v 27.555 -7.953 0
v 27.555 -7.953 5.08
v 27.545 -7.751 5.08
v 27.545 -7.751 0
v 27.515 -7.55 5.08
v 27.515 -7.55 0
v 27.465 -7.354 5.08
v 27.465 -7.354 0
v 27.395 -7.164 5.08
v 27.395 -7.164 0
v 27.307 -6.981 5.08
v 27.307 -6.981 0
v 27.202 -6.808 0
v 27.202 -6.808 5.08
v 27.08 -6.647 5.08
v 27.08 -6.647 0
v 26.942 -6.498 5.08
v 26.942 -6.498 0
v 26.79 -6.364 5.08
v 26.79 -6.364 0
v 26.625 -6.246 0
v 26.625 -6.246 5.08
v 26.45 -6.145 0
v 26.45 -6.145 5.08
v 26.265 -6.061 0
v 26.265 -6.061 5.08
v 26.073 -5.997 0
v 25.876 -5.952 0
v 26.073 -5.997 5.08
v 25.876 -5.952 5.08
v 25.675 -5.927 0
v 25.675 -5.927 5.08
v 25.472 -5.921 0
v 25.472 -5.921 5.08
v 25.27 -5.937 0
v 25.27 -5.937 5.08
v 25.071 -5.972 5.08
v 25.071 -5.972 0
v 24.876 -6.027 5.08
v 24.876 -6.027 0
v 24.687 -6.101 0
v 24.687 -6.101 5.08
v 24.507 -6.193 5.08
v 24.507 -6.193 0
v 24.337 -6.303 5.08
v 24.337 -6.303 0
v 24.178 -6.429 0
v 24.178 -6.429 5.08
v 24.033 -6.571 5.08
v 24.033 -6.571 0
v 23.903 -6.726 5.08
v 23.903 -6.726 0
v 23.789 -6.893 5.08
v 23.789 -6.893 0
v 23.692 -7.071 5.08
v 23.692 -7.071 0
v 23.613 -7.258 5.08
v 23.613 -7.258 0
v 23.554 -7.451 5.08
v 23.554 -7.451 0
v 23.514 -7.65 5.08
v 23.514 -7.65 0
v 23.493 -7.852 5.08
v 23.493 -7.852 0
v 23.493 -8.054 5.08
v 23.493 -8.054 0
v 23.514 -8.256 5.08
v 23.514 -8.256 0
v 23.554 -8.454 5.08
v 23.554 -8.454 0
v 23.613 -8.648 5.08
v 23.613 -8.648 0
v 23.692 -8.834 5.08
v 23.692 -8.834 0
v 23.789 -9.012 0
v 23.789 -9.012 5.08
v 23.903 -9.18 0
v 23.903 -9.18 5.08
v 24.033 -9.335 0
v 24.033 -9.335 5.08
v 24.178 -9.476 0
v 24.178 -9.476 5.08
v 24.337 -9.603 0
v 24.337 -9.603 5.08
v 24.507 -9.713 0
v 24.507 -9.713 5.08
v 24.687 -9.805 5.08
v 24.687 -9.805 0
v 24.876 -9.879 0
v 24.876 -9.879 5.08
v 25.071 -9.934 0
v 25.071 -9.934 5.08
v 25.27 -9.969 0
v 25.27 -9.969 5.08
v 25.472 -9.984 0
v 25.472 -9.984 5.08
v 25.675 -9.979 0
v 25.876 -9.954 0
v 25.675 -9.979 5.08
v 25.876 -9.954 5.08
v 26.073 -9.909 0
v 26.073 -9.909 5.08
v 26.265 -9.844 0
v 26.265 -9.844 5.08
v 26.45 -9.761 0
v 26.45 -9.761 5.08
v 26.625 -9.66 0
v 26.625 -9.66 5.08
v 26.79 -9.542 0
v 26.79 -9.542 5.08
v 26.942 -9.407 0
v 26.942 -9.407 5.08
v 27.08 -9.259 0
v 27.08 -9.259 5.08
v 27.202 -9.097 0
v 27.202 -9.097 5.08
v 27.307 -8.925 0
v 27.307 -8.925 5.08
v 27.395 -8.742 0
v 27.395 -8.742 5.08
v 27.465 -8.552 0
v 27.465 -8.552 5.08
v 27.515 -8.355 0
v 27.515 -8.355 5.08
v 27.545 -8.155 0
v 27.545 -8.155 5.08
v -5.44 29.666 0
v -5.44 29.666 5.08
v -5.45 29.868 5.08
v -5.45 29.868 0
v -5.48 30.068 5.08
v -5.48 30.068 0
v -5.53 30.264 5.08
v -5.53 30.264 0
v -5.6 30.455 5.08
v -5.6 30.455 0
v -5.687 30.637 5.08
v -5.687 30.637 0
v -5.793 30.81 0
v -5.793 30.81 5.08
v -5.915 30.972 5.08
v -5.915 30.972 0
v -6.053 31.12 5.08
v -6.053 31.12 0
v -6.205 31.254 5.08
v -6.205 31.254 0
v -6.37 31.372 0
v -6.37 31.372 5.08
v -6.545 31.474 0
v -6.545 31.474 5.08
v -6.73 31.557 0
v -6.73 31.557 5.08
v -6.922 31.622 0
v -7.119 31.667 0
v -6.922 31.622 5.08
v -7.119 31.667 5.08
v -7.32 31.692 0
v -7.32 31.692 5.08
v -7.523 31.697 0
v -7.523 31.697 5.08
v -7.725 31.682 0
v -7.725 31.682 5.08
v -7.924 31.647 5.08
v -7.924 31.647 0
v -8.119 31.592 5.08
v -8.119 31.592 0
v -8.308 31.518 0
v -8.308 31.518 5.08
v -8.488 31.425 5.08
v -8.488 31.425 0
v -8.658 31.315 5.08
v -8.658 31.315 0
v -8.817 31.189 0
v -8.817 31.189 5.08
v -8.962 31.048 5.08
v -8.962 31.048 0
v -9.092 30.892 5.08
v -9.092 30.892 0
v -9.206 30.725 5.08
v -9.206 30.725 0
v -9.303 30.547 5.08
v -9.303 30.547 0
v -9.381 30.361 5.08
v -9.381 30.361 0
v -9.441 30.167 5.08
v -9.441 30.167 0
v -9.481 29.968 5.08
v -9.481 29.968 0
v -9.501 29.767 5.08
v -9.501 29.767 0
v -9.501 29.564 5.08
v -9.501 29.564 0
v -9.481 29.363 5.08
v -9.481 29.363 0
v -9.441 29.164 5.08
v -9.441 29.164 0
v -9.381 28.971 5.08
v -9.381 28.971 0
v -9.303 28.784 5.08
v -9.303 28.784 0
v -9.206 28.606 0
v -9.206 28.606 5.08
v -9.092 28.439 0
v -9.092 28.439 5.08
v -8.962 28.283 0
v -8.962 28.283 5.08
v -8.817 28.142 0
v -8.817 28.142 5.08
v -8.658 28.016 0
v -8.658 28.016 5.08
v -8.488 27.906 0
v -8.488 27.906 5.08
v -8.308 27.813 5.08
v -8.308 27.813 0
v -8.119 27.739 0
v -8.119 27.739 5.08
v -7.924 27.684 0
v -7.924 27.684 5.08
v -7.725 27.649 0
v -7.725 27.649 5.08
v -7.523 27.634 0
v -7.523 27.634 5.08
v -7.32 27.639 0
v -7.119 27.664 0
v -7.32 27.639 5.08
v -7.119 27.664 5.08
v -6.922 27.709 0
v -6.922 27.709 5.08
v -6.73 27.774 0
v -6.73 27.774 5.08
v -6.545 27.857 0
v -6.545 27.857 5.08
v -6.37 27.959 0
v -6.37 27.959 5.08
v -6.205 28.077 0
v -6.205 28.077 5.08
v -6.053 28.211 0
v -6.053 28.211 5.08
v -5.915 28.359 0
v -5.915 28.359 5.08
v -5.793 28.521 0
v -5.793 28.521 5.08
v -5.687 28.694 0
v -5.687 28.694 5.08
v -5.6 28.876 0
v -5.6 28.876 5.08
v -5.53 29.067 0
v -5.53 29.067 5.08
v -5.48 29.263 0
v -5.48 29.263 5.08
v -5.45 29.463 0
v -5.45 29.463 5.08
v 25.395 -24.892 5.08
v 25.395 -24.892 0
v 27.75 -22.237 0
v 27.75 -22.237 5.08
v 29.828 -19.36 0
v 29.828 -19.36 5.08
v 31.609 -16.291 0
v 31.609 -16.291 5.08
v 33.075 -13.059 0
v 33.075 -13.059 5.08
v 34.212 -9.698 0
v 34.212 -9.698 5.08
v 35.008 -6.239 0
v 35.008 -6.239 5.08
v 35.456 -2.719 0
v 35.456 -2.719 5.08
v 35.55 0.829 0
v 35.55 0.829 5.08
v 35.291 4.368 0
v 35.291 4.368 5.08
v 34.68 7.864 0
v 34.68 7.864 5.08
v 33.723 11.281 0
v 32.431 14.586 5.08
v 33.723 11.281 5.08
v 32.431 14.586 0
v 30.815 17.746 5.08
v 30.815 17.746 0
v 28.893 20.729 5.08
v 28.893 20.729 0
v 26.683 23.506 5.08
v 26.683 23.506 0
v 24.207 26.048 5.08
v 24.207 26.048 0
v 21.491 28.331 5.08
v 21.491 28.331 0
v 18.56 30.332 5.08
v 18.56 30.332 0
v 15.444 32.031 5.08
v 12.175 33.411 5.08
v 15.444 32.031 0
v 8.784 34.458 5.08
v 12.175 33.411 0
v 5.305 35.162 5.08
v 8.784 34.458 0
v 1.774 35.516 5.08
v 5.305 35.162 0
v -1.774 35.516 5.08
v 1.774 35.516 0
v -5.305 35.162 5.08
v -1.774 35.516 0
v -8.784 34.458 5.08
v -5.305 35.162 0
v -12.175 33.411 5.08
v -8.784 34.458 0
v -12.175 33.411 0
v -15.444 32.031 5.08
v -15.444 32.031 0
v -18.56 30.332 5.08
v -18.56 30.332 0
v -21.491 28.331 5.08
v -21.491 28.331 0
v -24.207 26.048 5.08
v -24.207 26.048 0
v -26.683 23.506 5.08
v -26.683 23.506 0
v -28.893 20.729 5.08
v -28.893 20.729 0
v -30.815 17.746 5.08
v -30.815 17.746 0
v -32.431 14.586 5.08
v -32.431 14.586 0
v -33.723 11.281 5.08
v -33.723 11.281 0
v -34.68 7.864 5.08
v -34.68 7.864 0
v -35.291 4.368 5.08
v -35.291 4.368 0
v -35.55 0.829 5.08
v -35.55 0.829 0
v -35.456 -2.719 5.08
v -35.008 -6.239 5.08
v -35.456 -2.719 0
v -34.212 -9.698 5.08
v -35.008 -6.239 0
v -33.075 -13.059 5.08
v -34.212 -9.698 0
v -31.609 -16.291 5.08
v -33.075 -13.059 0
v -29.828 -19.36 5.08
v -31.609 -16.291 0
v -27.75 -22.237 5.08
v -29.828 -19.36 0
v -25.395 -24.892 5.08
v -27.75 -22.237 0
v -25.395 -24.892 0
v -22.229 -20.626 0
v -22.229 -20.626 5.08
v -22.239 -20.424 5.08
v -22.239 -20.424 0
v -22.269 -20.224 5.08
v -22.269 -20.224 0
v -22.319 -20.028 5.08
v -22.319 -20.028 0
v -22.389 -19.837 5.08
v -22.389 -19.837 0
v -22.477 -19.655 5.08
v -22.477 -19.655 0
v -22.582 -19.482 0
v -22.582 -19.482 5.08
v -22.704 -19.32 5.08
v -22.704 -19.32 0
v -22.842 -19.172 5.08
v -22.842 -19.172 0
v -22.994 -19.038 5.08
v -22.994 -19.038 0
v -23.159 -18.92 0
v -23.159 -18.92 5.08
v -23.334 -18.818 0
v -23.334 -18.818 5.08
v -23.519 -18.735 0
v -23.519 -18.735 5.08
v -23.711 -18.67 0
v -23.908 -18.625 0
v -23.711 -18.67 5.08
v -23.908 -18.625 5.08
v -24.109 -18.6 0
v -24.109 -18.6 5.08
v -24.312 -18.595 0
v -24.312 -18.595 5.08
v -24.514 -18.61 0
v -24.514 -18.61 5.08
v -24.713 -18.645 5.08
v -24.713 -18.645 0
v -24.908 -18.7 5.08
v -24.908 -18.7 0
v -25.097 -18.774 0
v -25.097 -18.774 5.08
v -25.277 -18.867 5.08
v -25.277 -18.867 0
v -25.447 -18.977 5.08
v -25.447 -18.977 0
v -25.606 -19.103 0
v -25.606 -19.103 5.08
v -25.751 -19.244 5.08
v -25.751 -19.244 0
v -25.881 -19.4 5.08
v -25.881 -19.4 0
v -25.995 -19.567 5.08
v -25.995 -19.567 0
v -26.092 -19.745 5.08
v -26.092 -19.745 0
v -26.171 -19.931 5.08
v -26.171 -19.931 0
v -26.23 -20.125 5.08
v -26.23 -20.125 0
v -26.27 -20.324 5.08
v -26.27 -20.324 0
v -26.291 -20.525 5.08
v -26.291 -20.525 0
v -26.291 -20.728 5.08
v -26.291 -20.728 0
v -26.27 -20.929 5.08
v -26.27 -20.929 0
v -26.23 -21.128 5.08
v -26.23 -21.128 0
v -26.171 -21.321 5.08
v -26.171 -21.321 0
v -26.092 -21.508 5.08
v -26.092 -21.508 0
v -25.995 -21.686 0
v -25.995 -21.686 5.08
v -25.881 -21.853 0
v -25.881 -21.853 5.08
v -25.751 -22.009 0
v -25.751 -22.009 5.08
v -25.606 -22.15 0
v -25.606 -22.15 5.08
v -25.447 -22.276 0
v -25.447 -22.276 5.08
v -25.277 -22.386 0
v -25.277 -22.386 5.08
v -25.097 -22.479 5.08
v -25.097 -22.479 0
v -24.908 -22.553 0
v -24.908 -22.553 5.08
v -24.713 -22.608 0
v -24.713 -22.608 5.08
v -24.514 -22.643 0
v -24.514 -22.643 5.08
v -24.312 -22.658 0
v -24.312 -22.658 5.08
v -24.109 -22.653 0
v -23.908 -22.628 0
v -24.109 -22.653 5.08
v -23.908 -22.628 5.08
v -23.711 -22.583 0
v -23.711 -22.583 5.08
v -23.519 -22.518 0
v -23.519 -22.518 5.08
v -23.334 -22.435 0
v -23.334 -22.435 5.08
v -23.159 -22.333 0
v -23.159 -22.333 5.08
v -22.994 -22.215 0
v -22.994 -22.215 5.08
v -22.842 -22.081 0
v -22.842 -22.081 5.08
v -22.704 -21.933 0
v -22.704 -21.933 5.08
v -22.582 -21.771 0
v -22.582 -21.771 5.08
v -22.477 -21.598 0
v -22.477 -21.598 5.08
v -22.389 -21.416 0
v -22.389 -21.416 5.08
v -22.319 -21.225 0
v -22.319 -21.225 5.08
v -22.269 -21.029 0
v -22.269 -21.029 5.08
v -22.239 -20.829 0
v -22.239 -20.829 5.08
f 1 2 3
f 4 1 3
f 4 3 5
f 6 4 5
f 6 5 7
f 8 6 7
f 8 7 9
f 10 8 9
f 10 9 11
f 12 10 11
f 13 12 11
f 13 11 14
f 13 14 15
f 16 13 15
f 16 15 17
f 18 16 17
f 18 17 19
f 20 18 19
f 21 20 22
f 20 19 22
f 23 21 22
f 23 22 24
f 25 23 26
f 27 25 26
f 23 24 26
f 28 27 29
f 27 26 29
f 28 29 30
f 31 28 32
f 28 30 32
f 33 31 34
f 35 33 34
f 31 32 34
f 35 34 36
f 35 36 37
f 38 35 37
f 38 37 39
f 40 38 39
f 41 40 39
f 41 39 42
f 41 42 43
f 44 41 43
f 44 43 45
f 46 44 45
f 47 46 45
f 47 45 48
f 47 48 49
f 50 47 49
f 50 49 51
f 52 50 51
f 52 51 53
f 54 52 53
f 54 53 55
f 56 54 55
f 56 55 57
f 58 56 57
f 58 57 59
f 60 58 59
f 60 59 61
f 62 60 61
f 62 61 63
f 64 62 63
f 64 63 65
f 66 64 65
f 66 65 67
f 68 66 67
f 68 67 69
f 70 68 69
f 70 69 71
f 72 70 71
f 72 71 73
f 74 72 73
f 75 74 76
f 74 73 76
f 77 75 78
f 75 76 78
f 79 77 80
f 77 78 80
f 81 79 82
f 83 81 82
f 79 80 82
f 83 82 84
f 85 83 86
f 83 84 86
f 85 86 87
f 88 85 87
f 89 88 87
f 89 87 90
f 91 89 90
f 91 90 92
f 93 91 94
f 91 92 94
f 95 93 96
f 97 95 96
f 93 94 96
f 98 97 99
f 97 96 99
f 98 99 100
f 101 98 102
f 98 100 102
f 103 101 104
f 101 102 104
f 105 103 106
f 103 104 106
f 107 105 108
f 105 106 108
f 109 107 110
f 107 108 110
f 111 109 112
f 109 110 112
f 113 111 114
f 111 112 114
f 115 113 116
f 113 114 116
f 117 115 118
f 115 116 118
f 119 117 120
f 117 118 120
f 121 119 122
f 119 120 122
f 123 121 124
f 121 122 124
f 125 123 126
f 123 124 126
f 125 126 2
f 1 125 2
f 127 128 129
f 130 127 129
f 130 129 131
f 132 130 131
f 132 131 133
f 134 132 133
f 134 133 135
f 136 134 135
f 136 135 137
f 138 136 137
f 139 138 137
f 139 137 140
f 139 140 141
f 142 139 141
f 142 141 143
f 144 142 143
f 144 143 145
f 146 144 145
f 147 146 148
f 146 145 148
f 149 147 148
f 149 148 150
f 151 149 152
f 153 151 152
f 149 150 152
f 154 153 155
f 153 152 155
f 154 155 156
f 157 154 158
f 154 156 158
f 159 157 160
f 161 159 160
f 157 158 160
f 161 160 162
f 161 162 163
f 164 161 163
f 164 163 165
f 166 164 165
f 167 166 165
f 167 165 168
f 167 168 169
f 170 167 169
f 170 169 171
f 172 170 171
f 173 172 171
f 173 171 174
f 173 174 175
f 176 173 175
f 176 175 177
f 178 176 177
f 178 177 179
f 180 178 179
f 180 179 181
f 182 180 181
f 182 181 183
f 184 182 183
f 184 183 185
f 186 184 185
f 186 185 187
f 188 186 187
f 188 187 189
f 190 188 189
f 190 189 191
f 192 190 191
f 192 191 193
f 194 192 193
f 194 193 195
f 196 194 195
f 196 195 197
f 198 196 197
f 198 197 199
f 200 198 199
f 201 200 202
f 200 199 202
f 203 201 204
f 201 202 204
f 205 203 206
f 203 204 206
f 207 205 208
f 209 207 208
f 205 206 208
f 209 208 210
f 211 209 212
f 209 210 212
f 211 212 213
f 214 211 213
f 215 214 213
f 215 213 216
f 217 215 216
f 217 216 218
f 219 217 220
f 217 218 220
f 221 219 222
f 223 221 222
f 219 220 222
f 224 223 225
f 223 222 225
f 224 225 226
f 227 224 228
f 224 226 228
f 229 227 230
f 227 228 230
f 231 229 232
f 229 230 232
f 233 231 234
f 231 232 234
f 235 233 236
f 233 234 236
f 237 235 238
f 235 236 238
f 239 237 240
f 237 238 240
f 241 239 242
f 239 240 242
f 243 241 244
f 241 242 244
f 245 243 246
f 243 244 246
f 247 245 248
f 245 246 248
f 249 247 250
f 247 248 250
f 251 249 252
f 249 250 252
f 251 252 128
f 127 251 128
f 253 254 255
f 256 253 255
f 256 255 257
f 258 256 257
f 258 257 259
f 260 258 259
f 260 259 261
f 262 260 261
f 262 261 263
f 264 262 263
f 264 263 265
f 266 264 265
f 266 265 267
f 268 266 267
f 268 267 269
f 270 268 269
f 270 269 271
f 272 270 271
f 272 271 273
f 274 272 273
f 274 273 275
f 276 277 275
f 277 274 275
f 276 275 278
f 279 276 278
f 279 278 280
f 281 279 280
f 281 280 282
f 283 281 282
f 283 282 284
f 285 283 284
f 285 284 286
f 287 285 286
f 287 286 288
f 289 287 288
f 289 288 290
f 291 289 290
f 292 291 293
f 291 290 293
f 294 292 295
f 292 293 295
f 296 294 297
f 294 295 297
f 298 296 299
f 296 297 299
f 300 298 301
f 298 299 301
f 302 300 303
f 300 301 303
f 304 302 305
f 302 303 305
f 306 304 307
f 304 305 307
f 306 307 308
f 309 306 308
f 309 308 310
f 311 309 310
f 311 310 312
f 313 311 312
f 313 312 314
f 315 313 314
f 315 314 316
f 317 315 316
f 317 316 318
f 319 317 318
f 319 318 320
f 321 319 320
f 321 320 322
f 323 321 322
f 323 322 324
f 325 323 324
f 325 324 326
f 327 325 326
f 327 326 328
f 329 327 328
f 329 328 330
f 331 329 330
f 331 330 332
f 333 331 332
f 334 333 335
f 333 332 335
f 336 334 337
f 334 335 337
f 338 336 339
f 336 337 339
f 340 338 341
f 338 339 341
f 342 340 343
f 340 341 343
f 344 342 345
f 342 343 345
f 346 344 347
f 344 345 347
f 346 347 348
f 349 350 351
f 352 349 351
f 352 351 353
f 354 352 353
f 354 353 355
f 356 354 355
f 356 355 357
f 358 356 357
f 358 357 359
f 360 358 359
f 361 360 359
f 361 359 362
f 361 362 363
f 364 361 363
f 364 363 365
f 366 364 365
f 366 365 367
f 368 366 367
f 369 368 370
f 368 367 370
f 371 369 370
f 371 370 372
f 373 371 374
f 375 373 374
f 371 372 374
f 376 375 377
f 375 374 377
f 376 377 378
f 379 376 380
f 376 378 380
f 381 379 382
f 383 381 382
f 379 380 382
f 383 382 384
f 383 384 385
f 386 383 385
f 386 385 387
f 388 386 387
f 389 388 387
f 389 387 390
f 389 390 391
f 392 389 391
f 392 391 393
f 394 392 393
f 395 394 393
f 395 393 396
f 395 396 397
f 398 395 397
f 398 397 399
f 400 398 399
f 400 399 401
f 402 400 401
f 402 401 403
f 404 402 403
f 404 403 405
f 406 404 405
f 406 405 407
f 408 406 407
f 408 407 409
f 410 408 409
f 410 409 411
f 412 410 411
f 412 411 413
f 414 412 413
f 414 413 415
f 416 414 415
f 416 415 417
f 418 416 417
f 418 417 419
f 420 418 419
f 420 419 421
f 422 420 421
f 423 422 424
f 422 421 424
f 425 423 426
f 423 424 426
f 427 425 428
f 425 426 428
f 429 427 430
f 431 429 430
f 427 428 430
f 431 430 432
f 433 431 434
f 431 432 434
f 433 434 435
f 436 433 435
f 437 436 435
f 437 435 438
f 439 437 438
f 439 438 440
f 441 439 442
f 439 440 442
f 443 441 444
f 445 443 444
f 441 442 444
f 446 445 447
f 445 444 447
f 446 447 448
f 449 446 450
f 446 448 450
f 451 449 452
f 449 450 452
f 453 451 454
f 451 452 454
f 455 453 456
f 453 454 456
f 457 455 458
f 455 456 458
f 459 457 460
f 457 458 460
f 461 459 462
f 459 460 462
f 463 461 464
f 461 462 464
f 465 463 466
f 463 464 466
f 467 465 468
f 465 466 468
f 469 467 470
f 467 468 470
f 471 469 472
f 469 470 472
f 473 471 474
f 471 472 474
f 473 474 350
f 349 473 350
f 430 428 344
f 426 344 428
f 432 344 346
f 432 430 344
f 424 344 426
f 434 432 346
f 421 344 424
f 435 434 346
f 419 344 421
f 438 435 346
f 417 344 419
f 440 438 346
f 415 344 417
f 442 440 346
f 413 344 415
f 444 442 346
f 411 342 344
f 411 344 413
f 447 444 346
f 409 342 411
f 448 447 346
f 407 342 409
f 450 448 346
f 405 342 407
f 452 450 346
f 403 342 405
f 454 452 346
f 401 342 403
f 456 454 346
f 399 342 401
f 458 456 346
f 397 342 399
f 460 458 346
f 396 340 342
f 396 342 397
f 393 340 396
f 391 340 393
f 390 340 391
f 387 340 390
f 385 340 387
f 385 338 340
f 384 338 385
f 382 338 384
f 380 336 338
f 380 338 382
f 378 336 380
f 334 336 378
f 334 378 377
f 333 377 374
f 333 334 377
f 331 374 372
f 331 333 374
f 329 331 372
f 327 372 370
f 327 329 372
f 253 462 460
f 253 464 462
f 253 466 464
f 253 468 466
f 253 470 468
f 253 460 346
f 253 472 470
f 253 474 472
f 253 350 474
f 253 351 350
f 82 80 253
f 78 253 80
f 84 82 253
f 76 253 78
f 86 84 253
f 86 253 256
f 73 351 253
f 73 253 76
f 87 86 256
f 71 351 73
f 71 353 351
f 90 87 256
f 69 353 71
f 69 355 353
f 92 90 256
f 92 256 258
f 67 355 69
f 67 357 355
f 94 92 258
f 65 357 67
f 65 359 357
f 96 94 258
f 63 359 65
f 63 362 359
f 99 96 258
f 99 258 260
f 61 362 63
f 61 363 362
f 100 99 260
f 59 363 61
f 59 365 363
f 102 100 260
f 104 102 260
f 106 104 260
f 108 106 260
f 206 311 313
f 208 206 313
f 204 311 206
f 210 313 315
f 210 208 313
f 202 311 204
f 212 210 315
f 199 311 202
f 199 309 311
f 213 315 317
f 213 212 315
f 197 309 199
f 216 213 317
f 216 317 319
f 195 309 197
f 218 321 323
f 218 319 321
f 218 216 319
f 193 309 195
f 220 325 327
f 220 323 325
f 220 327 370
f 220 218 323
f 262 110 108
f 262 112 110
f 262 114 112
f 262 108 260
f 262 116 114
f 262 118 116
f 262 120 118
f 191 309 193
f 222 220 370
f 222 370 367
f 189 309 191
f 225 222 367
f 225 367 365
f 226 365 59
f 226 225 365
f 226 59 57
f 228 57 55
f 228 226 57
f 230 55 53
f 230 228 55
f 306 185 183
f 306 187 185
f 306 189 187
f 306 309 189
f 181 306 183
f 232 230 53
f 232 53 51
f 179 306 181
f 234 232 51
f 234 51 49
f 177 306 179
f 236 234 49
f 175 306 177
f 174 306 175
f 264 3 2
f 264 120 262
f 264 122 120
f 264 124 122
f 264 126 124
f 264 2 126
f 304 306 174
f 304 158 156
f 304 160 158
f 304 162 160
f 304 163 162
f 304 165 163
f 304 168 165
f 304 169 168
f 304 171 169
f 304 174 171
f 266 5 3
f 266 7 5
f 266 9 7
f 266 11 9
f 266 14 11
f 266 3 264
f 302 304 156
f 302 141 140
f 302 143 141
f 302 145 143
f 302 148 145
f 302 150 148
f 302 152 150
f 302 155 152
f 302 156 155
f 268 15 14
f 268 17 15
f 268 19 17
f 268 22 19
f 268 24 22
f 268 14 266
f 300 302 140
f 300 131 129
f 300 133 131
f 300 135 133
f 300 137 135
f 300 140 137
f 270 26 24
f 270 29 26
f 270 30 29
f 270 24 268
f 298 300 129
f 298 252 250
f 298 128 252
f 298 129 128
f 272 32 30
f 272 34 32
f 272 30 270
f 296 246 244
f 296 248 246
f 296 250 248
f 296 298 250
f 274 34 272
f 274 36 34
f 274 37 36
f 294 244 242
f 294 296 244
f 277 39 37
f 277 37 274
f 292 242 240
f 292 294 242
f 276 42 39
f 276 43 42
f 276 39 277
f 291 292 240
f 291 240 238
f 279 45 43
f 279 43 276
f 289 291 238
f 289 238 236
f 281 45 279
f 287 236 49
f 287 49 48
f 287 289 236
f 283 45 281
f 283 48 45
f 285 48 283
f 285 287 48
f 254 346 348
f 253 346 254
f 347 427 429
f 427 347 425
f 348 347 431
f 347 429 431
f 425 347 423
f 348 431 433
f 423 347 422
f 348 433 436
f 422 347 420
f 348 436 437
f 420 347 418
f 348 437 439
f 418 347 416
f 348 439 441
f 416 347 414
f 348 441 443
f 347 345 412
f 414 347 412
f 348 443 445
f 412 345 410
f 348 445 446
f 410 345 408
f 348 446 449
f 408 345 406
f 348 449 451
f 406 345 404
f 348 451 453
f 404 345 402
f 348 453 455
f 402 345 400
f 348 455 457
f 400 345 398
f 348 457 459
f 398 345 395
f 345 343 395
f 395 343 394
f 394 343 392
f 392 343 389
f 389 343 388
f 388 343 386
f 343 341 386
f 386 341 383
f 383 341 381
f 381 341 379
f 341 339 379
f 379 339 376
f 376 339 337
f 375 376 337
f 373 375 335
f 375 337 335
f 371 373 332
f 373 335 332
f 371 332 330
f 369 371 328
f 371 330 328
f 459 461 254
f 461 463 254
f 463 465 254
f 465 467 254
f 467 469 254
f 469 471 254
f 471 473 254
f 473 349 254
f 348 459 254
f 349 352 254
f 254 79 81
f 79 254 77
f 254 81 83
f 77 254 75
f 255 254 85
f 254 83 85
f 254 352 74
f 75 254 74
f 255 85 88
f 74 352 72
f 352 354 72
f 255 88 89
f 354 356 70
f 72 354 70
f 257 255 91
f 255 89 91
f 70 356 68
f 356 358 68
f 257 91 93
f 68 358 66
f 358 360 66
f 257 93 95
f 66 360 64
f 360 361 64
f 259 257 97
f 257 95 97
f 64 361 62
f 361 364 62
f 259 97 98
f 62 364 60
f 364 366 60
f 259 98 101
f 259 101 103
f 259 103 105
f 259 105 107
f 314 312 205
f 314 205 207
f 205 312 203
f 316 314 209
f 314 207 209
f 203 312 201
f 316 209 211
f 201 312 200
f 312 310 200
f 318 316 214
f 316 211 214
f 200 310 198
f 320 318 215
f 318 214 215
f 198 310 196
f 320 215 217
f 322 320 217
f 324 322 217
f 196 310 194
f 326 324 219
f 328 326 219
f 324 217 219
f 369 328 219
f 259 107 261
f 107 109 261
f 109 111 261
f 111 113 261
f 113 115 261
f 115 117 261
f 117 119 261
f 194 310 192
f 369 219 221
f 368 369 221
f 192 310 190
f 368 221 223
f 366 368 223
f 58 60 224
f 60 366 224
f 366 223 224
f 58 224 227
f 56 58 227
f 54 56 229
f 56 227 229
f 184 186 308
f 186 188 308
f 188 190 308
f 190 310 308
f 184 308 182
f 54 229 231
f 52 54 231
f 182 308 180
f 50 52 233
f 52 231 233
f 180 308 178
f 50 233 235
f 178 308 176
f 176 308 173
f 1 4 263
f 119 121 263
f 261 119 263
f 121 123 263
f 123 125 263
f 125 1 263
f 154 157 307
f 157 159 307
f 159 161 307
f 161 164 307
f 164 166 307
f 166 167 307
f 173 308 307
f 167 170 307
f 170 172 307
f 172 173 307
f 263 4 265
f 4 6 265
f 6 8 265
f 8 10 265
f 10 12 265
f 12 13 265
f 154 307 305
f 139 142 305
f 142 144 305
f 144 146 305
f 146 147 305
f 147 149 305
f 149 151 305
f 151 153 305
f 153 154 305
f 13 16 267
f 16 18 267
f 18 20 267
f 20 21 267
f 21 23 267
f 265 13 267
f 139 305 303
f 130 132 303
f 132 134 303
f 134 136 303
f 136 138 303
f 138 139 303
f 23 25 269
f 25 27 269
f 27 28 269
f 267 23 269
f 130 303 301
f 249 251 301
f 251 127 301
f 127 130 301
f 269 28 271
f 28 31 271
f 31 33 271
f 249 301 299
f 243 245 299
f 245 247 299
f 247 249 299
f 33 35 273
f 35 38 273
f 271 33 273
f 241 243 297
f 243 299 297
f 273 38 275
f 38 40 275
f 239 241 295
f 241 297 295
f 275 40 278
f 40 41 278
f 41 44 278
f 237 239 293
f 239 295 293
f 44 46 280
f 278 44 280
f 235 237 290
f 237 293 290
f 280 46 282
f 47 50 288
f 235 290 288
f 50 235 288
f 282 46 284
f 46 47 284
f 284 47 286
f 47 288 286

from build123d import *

# Parameters (mm, degrees)
SKETCH1_R           = 35.56
BOSS_EXTRUDE1_DEPTH = 5.08
CUT_EXTRUDE1_DEPTH  = 51.545361805
SKETCH7_R           = 2.032
CUT_EXTRUDE2_DEPTH  = 51.545361805


with BuildPart() as part:
    # Sketch1 → Boss-Extrude1 (new body)
    with BuildSketch(Plane.XY):
        Circle(SKETCH1_R)
    extrude(amount=BOSS_EXTRUDE1_DEPTH)

    # Sketch2 → Cut-Extrude1 (cut, through all)
    with BuildSketch(Plane.XY.offset(5.08)):
        Polygon((0, -35.56), (-36.256055522, -35.56), (-36.256055522, -24.892), (33.75035888, -24.892), (33.75035888, -35.56), align=None)
    extrude(amount=-CUT_EXTRUDE1_DEPTH, mode=Mode.SUBTRACT)

    # Sketch7 → Cut-Extrude2 (cut, through all)
    with BuildSketch(Plane.XY.offset(5.08)):
        with Locations((-24.261099887, -20.626476503)):
            Circle(SKETCH7_R)
        with Locations((-7.471969114, 29.665523497)):
            Circle(SKETCH7_R)
        with Locations((25.522900113, -7.952823738)):
            Circle(SKETCH7_R)
    extrude(amount=-CUT_EXTRUDE2_DEPTH, mode=Mode.SUBTRACT)


solid = part.part
